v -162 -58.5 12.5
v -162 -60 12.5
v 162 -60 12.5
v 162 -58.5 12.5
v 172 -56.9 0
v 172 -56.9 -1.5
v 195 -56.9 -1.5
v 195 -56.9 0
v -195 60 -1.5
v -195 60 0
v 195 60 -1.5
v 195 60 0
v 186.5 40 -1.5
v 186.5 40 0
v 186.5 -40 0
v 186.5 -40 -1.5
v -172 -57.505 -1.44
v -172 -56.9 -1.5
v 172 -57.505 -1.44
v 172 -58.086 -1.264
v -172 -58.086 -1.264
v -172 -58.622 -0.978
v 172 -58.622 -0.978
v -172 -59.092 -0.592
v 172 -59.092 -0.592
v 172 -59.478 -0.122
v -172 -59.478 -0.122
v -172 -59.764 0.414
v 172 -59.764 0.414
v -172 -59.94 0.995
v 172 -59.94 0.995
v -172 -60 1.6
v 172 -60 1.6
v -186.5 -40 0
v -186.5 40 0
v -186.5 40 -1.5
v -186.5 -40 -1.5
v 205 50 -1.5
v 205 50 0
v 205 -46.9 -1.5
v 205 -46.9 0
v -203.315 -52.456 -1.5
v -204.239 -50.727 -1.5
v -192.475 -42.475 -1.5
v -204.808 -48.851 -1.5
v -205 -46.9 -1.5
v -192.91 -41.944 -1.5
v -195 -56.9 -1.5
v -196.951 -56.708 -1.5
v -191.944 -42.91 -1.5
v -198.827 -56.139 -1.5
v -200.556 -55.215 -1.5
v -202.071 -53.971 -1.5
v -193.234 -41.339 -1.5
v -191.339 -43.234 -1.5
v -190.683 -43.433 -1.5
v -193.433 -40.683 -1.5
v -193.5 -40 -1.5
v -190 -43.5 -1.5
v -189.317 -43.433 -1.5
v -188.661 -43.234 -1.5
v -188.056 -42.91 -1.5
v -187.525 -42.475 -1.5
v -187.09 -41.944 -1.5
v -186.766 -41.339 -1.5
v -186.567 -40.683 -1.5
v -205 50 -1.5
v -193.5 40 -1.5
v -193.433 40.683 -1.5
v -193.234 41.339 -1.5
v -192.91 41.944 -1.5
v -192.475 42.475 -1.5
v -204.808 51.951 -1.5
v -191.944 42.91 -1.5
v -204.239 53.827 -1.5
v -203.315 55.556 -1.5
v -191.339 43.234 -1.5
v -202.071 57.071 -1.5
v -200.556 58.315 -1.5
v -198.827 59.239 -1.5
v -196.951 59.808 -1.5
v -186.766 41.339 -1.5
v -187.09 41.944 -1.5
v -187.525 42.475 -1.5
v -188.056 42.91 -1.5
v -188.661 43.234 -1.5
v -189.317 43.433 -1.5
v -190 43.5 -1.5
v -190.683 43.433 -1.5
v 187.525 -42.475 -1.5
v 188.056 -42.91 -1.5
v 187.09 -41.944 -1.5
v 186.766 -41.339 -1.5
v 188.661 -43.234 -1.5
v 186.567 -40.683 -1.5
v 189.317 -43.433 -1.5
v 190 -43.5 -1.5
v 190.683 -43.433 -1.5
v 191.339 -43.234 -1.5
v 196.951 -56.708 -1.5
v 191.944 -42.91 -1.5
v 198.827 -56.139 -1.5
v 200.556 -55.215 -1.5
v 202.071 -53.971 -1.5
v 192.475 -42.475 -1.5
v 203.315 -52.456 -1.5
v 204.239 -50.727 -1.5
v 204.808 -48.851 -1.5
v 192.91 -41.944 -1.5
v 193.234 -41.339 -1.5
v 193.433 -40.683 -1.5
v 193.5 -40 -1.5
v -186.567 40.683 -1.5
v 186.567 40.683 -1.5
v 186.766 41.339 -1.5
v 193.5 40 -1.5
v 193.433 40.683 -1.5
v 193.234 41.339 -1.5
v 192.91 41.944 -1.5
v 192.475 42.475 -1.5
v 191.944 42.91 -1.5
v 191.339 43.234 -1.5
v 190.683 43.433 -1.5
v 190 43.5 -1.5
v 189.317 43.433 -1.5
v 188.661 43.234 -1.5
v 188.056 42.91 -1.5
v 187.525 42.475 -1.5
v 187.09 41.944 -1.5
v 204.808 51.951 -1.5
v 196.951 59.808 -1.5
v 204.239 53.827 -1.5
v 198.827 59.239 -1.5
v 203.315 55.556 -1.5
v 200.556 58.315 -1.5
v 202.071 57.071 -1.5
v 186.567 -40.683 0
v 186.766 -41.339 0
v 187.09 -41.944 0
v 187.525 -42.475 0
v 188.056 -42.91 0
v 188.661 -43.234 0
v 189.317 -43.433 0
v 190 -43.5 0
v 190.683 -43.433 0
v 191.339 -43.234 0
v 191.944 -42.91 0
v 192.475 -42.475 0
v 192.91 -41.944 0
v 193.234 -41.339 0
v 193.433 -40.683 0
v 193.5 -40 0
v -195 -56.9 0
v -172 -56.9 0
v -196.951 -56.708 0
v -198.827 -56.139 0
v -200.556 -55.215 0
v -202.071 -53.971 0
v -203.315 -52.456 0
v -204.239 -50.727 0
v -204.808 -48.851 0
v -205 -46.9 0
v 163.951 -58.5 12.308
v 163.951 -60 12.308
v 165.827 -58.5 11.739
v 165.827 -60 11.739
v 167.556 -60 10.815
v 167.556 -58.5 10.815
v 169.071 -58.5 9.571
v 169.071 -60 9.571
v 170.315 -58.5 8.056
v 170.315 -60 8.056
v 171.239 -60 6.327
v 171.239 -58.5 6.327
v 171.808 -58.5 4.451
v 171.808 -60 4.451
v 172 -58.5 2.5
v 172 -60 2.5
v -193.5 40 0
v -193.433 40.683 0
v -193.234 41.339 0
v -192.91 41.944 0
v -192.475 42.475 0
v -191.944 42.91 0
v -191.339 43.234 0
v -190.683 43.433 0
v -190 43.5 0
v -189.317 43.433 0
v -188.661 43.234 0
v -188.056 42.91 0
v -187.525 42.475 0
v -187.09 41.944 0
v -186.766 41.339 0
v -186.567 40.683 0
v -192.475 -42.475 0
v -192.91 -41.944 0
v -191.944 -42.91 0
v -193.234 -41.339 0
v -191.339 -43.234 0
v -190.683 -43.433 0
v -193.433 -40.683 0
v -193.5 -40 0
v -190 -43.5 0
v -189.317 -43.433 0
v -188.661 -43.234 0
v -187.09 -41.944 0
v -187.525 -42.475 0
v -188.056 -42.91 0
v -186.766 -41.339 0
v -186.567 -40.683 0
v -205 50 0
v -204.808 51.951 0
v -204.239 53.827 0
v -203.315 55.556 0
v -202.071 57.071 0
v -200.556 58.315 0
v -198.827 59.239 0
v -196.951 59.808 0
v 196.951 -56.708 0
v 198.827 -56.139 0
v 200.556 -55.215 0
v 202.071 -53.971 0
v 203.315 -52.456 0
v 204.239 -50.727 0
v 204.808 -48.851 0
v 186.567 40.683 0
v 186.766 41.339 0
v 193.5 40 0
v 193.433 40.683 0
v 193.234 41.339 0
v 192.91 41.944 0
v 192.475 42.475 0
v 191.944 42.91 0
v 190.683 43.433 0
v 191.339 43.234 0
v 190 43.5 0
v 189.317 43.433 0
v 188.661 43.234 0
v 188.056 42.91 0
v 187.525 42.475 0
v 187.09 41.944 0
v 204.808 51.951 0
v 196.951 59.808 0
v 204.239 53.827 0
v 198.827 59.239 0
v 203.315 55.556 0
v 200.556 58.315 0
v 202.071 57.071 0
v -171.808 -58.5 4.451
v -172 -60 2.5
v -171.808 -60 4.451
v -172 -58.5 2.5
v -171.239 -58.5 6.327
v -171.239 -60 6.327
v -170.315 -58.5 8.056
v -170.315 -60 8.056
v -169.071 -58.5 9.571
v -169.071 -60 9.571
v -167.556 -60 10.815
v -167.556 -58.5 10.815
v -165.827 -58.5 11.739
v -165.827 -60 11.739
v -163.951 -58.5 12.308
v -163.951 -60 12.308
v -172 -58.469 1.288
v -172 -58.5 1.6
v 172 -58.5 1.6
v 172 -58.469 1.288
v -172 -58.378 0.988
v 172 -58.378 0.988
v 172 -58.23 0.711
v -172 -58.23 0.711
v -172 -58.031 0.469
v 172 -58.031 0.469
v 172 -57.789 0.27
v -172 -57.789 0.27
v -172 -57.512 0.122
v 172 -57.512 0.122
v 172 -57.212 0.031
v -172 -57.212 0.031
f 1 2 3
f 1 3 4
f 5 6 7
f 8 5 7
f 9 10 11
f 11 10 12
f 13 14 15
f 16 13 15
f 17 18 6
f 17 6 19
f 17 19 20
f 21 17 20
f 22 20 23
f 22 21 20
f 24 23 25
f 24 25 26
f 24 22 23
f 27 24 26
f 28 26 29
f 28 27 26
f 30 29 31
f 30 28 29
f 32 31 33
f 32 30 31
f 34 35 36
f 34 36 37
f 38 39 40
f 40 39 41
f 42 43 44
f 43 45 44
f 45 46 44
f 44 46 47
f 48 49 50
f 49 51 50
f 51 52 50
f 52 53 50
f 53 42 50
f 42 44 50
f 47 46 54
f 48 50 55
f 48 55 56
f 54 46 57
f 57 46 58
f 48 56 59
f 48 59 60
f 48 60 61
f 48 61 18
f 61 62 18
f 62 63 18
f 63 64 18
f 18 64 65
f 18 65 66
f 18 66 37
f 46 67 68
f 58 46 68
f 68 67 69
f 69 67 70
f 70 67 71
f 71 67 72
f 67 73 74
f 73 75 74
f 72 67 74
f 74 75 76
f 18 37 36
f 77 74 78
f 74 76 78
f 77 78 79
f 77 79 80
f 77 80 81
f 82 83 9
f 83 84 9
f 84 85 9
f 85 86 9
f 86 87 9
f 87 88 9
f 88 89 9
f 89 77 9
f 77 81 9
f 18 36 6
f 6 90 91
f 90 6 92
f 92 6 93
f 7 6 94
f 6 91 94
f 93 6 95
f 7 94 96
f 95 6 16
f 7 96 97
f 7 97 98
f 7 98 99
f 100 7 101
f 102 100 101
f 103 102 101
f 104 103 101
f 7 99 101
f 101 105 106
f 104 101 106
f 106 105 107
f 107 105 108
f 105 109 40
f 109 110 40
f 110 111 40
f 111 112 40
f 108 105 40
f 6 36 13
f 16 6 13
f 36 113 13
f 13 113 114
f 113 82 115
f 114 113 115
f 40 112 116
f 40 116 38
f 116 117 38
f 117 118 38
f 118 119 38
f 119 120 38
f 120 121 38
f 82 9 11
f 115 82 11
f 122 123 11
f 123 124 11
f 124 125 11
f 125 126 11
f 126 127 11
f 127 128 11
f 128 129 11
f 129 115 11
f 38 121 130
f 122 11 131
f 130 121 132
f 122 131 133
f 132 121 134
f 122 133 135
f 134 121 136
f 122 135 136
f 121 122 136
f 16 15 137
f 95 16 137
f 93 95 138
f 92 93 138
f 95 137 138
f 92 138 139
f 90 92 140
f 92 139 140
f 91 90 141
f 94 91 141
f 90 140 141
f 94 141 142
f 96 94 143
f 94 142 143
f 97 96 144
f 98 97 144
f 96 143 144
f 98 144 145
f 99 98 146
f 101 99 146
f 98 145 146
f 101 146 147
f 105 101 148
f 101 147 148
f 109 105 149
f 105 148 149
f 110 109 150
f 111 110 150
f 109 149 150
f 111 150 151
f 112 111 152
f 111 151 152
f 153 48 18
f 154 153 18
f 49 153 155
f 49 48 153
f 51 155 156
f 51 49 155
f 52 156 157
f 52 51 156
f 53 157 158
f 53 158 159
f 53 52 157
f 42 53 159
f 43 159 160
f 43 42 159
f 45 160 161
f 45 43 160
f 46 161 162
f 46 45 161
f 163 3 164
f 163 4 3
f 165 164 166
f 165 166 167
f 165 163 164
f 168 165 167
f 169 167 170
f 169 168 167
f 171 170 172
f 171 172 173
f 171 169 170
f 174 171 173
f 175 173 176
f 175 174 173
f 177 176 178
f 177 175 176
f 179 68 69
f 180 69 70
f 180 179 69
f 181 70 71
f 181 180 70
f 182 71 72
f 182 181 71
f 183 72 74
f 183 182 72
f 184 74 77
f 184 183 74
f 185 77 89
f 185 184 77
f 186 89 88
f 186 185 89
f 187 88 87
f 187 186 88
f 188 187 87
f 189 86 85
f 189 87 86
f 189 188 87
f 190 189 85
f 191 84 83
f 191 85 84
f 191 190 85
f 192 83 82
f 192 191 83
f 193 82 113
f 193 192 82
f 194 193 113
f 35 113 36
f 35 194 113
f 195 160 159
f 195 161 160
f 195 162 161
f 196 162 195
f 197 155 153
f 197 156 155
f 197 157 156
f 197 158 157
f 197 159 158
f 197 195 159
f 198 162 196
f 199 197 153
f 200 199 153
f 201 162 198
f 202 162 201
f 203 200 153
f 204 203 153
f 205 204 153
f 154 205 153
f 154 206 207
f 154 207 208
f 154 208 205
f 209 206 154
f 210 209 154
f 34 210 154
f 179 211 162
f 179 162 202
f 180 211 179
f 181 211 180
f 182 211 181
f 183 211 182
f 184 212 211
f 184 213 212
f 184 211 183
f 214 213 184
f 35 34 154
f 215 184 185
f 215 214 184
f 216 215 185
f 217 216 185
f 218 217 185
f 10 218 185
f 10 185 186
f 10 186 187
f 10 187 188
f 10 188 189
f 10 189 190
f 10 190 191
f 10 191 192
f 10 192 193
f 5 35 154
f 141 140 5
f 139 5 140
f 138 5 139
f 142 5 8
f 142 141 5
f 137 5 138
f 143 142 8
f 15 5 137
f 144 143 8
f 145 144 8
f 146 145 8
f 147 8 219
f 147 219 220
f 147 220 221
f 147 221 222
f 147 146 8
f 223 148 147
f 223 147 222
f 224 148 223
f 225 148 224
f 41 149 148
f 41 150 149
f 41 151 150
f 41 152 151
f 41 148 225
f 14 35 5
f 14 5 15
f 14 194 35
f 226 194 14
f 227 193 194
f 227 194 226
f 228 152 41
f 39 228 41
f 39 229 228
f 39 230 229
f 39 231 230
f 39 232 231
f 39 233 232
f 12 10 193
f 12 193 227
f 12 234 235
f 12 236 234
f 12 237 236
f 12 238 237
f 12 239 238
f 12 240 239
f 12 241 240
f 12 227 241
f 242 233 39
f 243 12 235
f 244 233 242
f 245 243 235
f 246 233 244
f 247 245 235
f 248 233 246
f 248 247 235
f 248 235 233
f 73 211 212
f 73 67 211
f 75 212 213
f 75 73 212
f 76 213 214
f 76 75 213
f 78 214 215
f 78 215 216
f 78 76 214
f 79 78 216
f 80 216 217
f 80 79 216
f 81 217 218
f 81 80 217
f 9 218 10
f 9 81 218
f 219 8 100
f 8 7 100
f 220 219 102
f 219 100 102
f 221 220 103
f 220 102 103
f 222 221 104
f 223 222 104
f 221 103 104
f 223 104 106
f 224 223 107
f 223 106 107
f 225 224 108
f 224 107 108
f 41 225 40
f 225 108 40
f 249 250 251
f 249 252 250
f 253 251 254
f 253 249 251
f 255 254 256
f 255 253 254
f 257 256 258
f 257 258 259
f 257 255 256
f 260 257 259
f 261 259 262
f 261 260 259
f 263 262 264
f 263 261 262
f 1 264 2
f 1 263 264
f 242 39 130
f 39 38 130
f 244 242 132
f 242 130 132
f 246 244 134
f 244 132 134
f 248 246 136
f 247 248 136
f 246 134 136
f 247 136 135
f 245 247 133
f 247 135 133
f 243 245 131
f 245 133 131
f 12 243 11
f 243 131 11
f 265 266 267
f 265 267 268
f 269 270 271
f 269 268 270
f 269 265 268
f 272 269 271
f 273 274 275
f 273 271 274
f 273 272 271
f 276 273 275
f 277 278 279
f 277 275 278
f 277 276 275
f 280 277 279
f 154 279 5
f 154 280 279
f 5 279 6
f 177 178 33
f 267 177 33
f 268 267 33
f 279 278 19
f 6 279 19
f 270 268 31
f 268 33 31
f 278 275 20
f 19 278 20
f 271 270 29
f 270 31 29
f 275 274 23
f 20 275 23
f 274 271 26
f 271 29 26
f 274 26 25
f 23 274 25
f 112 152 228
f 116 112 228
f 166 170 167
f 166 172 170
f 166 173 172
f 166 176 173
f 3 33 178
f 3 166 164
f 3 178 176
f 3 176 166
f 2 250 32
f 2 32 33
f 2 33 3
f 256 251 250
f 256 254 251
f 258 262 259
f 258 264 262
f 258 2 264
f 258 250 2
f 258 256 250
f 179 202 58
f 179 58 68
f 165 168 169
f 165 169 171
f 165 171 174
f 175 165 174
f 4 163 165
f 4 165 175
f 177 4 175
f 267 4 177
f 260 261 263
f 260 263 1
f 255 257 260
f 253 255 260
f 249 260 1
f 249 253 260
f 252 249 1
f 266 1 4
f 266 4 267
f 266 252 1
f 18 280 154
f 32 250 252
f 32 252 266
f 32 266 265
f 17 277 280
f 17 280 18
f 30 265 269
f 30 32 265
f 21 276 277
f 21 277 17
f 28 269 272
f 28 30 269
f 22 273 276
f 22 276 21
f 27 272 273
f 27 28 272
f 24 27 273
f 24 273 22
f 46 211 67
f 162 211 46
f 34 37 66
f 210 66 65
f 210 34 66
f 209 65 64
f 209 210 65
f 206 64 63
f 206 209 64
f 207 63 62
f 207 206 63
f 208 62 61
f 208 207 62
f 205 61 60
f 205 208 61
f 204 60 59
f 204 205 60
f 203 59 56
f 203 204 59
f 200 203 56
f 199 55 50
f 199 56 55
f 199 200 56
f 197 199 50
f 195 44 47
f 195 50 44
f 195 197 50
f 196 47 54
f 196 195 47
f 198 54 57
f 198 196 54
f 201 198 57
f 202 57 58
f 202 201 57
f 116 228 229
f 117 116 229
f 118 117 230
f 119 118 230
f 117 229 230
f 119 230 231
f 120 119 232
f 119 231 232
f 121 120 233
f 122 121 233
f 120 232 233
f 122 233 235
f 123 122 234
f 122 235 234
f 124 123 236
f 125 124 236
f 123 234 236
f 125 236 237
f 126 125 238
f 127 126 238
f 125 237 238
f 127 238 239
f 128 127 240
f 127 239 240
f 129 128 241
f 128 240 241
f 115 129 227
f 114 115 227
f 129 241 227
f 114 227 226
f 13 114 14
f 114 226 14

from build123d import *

# Parameters (mm, degrees)
SKETCH_1_W                       = 410
SKETCH_1_H                       = 120
SM_BASE_FLANGE_1_DEPTH           = 1.5
SM_EDGE_FLANGE_1_STRIP_W         = 9.2
SM_EDGE_FLANGE_1_STRIP_H         = 1.5
SM_EDGE_FLANGE_1_STRIP_CUT_DEPTH = 410
SM_EDGE_FLANGE_1_DEPTH           = 410
SKETCH_8_W                       = 33
SKETCH_8_H                       = 14
CUT_EXTRUDE_1_DEPTH              = 3.1
FILLET_2_R                       = 10
CUT_EXTRUDE_3_DEPTH              = 10


# Sheet-metal steps are written as plain solids
with BuildPart() as part:
    # Sketch 1 → Базовая кромка1 (new body)
    with BuildSketch(Plane.XY):
        Rectangle(SKETCH_1_W, SKETCH_1_H)
    extrude(amount=-SM_BASE_FLANGE_1_DEPTH)

    # Ребро-кромка1 strip (across the edge) → Ребро-кромка1 strip cut (cut)
    with BuildSketch(Plane(origin=(-205, -60, 0), x_dir=(0, 1, 0), z_dir=(1, 0, 0))):
        with Locations((-1.5, -0.75)):
            Rectangle(SM_EDGE_FLANGE_1_STRIP_W, SM_EDGE_FLANGE_1_STRIP_H)
    extrude(amount=SM_EDGE_FLANGE_1_STRIP_CUT_DEPTH, mode=Mode.SUBTRACT)

    # Ребро-кромка1 section (across the edge) → Ребро-кромка1 (add)
    with BuildSketch(Plane(origin=(-205, -60, 0), x_dir=(0, 1, 0), z_dir=(1, 0, 0))):
        with BuildLine():
            Line((0, 1.6), (0, 12.5))
            Line((0, 12.5), (1.5, 12.5))
            Line((1.5, 12.5), (1.5, 1.6))
            ThreePointArc((1.5, 1.6), (1.96862915, 0.46862915), (3.1, 0))
            Line((3.1, 0), (3.1, -1.5))
            ThreePointArc((3.1, -1.5), (0.907968978, -0.592031022), (0, 1.6))
        make_face()
    extrude(amount=SM_EDGE_FLANGE_1_DEPTH)

    # Эскиз8 → Вырез-Вытянуть1 (cut)
    with BuildSketch(Plane(origin=(0, -60, 0), x_dir=(1, 0, 0), z_dir=(0, 1, 0))):
        with Locations((-188.5, -5.5)):
            Rectangle(SKETCH_8_W, SKETCH_8_H)
        with Locations((188.5, -5.5)):
            Rectangle(SKETCH_8_W, SKETCH_8_H)
    extrude(amount=CUT_EXTRUDE_1_DEPTH, mode=Mode.SUBTRACT)

    # Скругление2
    fillet_2_edges = [part.edges().sort_by_distance(p)[0] for p in [
        (-205, -56.9, -0.75),
        (205, -56.9, -0.75),
        (-172, -59.25, 12.5),
        (-205, 60, -0.75),
        (205, 60, -0.75),
        (172, -59.25, 12.5),
    ]]
    fillet(fillet_2_edges, radius=FILLET_2_R)

    # Эскиз13 → Вырез-Вытянуть3 (cut)
    with BuildSketch(Plane.XY):
        with BuildLine():
            Line((-186.5, 40), (-186.5, -40))
            ThreePointArc((-186.5, -40), (-190, -43.5), (-193.5, -40))
            Line((-193.5, -40), (-193.5, 40))
            ThreePointArc((-193.5, 40), (-190, 43.5), (-186.5, 40))
        make_face()
        with BuildLine():
            Line((186.5, 40), (186.5, -40))
            ThreePointArc((186.5, -40), (190, -43.5), (193.5, -40))
            Line((193.5, -40), (193.5, 40))
            ThreePointArc((193.5, 40), (190, 43.5), (186.5, 40))
        make_face()
    extrude(amount=-CUT_EXTRUDE_3_DEPTH, mode=Mode.SUBTRACT)


solid = part.part
